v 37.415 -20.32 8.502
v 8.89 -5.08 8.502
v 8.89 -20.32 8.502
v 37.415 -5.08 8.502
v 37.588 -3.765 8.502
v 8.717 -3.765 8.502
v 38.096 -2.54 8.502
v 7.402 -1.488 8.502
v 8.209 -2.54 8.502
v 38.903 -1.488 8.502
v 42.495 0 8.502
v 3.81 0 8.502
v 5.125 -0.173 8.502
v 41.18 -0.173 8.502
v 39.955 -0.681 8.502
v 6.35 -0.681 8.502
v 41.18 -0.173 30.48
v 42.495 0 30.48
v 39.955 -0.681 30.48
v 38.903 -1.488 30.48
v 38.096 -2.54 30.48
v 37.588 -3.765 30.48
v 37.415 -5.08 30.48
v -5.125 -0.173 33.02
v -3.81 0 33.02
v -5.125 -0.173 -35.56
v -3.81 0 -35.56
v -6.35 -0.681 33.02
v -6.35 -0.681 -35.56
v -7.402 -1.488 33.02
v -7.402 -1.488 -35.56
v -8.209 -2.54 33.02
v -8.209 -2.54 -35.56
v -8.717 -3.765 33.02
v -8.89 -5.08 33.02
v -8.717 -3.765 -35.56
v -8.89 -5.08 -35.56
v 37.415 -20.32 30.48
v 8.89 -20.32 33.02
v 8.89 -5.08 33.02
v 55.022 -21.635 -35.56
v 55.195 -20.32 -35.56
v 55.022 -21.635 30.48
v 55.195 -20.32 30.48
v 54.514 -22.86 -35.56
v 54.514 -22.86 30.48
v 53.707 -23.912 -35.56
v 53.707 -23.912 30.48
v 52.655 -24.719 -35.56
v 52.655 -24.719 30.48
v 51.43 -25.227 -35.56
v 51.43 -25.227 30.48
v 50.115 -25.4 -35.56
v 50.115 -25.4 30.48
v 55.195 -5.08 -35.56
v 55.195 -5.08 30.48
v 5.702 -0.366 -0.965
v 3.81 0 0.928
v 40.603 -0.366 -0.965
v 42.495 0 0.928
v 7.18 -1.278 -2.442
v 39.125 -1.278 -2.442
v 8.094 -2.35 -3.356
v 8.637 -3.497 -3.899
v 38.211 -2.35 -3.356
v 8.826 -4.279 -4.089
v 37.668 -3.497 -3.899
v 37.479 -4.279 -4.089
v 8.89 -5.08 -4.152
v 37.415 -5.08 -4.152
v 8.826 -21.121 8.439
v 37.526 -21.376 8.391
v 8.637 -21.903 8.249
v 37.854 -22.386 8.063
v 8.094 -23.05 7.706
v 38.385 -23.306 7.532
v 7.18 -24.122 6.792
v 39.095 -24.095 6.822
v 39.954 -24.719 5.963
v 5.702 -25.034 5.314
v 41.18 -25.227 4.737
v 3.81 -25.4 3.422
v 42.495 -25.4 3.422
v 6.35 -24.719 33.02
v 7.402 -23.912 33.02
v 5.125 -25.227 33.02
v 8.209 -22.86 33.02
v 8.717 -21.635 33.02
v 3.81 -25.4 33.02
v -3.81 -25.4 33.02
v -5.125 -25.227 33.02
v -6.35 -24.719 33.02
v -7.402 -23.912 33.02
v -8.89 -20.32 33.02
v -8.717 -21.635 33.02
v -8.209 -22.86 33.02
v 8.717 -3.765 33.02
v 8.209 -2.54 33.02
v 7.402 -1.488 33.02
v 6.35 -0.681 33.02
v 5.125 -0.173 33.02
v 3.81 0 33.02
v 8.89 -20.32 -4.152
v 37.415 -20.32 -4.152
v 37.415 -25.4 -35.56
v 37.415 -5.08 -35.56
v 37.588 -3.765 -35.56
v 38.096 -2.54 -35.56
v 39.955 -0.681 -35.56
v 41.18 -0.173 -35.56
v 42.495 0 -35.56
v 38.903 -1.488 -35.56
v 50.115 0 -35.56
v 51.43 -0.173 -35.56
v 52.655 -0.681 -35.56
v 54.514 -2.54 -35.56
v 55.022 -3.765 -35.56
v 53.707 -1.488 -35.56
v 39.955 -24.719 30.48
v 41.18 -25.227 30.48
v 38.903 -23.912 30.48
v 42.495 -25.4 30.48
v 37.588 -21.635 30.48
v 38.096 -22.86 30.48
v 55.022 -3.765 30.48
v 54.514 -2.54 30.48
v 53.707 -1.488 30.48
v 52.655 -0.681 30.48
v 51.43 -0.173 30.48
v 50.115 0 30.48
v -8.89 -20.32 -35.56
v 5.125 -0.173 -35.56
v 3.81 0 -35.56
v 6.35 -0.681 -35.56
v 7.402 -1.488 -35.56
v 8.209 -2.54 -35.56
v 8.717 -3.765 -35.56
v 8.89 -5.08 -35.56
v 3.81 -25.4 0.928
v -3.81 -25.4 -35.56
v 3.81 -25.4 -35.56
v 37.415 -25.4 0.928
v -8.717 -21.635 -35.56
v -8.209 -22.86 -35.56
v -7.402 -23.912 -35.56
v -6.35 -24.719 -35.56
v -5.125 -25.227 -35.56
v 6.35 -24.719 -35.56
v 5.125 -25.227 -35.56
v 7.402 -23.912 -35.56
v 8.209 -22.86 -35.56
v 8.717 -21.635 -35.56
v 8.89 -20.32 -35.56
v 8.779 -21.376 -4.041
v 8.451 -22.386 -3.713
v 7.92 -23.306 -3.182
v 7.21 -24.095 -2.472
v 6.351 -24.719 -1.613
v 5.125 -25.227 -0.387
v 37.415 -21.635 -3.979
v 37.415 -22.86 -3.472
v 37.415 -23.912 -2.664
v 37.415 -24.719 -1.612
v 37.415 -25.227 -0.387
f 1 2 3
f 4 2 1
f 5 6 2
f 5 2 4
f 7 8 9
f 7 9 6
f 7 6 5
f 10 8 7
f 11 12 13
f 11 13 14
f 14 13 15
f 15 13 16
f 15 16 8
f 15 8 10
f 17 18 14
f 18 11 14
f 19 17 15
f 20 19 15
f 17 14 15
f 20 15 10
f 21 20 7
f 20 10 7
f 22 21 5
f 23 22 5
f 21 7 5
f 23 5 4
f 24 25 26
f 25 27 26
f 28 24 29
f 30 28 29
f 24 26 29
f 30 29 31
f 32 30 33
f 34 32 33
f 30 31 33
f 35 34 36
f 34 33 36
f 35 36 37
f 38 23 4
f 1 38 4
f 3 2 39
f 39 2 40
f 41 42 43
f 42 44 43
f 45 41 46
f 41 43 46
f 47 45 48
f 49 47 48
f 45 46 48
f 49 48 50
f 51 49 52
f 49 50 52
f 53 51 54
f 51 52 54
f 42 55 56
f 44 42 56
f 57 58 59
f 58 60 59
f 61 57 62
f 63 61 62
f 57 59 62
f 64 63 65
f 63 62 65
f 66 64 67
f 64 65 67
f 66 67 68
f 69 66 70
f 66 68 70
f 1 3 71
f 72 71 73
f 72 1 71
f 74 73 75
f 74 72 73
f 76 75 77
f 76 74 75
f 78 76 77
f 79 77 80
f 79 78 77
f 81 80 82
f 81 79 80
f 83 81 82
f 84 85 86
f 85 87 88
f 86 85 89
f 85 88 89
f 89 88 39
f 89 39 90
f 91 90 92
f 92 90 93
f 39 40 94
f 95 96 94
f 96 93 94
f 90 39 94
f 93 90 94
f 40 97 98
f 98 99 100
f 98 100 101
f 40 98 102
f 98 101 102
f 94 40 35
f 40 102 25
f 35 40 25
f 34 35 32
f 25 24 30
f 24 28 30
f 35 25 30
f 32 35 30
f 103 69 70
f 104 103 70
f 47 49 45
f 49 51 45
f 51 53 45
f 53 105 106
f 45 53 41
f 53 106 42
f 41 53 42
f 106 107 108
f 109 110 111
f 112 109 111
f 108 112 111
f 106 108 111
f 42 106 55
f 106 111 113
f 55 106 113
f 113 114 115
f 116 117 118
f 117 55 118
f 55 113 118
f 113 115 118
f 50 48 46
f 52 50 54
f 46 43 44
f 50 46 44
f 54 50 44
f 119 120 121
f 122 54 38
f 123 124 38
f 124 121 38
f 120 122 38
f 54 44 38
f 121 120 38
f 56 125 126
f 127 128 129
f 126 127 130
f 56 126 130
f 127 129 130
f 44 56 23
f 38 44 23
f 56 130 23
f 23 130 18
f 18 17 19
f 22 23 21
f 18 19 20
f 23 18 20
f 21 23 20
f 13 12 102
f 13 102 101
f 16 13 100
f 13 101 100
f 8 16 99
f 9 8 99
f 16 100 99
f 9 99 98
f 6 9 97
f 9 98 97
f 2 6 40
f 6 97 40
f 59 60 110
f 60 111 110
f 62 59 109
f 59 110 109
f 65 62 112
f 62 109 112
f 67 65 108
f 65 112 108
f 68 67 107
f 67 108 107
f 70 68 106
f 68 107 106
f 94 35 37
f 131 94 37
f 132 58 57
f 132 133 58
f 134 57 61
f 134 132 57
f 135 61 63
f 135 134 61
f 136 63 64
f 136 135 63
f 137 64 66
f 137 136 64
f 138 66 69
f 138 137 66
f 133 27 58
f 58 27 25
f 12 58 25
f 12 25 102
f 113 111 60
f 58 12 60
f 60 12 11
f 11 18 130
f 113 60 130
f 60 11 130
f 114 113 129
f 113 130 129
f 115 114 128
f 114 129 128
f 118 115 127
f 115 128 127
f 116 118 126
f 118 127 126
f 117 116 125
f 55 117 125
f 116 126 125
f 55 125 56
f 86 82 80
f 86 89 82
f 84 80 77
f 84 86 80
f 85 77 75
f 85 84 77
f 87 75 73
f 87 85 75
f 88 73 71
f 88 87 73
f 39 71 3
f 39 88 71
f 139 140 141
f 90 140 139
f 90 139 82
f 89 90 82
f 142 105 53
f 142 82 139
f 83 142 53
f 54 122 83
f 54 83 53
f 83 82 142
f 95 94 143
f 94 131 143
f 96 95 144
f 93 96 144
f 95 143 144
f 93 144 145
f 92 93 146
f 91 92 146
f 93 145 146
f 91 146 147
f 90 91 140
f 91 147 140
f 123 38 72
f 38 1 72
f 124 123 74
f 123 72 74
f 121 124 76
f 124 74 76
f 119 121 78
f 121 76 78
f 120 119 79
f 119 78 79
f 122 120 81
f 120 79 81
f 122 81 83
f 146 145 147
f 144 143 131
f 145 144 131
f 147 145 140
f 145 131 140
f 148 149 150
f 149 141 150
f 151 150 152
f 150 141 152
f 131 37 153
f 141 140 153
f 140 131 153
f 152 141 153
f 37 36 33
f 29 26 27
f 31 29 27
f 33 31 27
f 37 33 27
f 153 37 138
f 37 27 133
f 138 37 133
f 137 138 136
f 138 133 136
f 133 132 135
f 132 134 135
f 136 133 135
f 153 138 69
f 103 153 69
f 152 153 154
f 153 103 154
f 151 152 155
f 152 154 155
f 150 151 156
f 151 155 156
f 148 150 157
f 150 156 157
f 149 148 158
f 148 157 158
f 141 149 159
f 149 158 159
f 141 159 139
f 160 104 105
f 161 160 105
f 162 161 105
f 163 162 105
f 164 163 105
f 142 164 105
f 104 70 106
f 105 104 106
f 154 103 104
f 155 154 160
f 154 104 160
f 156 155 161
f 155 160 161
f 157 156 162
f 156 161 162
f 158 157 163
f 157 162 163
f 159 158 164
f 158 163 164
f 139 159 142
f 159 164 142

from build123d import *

# Parameters (mm, degrees)
F1_DEPTH = 12.7
F0_W     = 17.78
F0_H     = 2.54
F0_W_2   = 28.5250723219
F0_H_2   = 12.6543707534
F0_H_3   = 4.4012725921
F2_DEPTH = 25.4
F3_R     = 5.08


with BuildPart() as f1:
    # F0 (on Front) → F1 (new body)
    with BuildSketch(Plane.XZ):
        Polygon((8.89, 33.02), (-8.89, 33.02), (-8.89, -33.02), (8.89, -33.02), (8.89, -4.1522149311), (8.89, 8.5021558223), align=None)
    extrude(amount=F1_DEPTH)

    # F0 (on Front) → F2 (join)
    with BuildSketch(Plane.XZ):
        Polygon((8.89, 33.02), (-8.89, 33.02), (-8.89, -33.02), (8.89, -33.02), (8.89, -4.1522149311), (8.89, 8.5021558223), align=None)
        with Locations((0, -34.29)):
            Rectangle(F0_W, F0_H)
        with Locations((23.1525361609, 2.1749704456)):
            Rectangle(F0_W_2, F0_H_2)
        Polygon((37.4150723219, 30.48), (37.4150723219, 8.5021558223), (37.4150723219, -4.1522149311), (37.4150723219, -31.1587274079), (55.1950723219, -31.1587274079), (55.1950723219, 30.48), align=None)
        with Locations((46.3050723219, -33.359363704)):
            Rectangle(F0_W, F0_H_3)
    extrude(amount=F2_DEPTH)

    # F3
    f3_edges = [f1.edges().sort_by_distance(p)[0] for p in [
        (55.195072, -25.4, -2.54),
        (55.195072, 0, -2.54),
        (37.415072, -25.4, 19.491078),
        (8.89, -25.4, 20.761078),
        (8.89, -25.4, -19.856107),
        (-8.89, -25.4, -1.27),
        (23.152536, -25.4, 8.502156),
        (23.152536, -25.4, -4.152215),
        (37.415072, 0, -19.856107),
        (37.415072, 0, 19.491078),
        (23.152536, 0, -4.152215),
        (8.89, 0, 20.761078),
        (8.89, 0, -19.856107),
        (-8.89, 0, -1.27),
    ]]
    fillet(f3_edges, radius=F3_R)


solid = f1.part
